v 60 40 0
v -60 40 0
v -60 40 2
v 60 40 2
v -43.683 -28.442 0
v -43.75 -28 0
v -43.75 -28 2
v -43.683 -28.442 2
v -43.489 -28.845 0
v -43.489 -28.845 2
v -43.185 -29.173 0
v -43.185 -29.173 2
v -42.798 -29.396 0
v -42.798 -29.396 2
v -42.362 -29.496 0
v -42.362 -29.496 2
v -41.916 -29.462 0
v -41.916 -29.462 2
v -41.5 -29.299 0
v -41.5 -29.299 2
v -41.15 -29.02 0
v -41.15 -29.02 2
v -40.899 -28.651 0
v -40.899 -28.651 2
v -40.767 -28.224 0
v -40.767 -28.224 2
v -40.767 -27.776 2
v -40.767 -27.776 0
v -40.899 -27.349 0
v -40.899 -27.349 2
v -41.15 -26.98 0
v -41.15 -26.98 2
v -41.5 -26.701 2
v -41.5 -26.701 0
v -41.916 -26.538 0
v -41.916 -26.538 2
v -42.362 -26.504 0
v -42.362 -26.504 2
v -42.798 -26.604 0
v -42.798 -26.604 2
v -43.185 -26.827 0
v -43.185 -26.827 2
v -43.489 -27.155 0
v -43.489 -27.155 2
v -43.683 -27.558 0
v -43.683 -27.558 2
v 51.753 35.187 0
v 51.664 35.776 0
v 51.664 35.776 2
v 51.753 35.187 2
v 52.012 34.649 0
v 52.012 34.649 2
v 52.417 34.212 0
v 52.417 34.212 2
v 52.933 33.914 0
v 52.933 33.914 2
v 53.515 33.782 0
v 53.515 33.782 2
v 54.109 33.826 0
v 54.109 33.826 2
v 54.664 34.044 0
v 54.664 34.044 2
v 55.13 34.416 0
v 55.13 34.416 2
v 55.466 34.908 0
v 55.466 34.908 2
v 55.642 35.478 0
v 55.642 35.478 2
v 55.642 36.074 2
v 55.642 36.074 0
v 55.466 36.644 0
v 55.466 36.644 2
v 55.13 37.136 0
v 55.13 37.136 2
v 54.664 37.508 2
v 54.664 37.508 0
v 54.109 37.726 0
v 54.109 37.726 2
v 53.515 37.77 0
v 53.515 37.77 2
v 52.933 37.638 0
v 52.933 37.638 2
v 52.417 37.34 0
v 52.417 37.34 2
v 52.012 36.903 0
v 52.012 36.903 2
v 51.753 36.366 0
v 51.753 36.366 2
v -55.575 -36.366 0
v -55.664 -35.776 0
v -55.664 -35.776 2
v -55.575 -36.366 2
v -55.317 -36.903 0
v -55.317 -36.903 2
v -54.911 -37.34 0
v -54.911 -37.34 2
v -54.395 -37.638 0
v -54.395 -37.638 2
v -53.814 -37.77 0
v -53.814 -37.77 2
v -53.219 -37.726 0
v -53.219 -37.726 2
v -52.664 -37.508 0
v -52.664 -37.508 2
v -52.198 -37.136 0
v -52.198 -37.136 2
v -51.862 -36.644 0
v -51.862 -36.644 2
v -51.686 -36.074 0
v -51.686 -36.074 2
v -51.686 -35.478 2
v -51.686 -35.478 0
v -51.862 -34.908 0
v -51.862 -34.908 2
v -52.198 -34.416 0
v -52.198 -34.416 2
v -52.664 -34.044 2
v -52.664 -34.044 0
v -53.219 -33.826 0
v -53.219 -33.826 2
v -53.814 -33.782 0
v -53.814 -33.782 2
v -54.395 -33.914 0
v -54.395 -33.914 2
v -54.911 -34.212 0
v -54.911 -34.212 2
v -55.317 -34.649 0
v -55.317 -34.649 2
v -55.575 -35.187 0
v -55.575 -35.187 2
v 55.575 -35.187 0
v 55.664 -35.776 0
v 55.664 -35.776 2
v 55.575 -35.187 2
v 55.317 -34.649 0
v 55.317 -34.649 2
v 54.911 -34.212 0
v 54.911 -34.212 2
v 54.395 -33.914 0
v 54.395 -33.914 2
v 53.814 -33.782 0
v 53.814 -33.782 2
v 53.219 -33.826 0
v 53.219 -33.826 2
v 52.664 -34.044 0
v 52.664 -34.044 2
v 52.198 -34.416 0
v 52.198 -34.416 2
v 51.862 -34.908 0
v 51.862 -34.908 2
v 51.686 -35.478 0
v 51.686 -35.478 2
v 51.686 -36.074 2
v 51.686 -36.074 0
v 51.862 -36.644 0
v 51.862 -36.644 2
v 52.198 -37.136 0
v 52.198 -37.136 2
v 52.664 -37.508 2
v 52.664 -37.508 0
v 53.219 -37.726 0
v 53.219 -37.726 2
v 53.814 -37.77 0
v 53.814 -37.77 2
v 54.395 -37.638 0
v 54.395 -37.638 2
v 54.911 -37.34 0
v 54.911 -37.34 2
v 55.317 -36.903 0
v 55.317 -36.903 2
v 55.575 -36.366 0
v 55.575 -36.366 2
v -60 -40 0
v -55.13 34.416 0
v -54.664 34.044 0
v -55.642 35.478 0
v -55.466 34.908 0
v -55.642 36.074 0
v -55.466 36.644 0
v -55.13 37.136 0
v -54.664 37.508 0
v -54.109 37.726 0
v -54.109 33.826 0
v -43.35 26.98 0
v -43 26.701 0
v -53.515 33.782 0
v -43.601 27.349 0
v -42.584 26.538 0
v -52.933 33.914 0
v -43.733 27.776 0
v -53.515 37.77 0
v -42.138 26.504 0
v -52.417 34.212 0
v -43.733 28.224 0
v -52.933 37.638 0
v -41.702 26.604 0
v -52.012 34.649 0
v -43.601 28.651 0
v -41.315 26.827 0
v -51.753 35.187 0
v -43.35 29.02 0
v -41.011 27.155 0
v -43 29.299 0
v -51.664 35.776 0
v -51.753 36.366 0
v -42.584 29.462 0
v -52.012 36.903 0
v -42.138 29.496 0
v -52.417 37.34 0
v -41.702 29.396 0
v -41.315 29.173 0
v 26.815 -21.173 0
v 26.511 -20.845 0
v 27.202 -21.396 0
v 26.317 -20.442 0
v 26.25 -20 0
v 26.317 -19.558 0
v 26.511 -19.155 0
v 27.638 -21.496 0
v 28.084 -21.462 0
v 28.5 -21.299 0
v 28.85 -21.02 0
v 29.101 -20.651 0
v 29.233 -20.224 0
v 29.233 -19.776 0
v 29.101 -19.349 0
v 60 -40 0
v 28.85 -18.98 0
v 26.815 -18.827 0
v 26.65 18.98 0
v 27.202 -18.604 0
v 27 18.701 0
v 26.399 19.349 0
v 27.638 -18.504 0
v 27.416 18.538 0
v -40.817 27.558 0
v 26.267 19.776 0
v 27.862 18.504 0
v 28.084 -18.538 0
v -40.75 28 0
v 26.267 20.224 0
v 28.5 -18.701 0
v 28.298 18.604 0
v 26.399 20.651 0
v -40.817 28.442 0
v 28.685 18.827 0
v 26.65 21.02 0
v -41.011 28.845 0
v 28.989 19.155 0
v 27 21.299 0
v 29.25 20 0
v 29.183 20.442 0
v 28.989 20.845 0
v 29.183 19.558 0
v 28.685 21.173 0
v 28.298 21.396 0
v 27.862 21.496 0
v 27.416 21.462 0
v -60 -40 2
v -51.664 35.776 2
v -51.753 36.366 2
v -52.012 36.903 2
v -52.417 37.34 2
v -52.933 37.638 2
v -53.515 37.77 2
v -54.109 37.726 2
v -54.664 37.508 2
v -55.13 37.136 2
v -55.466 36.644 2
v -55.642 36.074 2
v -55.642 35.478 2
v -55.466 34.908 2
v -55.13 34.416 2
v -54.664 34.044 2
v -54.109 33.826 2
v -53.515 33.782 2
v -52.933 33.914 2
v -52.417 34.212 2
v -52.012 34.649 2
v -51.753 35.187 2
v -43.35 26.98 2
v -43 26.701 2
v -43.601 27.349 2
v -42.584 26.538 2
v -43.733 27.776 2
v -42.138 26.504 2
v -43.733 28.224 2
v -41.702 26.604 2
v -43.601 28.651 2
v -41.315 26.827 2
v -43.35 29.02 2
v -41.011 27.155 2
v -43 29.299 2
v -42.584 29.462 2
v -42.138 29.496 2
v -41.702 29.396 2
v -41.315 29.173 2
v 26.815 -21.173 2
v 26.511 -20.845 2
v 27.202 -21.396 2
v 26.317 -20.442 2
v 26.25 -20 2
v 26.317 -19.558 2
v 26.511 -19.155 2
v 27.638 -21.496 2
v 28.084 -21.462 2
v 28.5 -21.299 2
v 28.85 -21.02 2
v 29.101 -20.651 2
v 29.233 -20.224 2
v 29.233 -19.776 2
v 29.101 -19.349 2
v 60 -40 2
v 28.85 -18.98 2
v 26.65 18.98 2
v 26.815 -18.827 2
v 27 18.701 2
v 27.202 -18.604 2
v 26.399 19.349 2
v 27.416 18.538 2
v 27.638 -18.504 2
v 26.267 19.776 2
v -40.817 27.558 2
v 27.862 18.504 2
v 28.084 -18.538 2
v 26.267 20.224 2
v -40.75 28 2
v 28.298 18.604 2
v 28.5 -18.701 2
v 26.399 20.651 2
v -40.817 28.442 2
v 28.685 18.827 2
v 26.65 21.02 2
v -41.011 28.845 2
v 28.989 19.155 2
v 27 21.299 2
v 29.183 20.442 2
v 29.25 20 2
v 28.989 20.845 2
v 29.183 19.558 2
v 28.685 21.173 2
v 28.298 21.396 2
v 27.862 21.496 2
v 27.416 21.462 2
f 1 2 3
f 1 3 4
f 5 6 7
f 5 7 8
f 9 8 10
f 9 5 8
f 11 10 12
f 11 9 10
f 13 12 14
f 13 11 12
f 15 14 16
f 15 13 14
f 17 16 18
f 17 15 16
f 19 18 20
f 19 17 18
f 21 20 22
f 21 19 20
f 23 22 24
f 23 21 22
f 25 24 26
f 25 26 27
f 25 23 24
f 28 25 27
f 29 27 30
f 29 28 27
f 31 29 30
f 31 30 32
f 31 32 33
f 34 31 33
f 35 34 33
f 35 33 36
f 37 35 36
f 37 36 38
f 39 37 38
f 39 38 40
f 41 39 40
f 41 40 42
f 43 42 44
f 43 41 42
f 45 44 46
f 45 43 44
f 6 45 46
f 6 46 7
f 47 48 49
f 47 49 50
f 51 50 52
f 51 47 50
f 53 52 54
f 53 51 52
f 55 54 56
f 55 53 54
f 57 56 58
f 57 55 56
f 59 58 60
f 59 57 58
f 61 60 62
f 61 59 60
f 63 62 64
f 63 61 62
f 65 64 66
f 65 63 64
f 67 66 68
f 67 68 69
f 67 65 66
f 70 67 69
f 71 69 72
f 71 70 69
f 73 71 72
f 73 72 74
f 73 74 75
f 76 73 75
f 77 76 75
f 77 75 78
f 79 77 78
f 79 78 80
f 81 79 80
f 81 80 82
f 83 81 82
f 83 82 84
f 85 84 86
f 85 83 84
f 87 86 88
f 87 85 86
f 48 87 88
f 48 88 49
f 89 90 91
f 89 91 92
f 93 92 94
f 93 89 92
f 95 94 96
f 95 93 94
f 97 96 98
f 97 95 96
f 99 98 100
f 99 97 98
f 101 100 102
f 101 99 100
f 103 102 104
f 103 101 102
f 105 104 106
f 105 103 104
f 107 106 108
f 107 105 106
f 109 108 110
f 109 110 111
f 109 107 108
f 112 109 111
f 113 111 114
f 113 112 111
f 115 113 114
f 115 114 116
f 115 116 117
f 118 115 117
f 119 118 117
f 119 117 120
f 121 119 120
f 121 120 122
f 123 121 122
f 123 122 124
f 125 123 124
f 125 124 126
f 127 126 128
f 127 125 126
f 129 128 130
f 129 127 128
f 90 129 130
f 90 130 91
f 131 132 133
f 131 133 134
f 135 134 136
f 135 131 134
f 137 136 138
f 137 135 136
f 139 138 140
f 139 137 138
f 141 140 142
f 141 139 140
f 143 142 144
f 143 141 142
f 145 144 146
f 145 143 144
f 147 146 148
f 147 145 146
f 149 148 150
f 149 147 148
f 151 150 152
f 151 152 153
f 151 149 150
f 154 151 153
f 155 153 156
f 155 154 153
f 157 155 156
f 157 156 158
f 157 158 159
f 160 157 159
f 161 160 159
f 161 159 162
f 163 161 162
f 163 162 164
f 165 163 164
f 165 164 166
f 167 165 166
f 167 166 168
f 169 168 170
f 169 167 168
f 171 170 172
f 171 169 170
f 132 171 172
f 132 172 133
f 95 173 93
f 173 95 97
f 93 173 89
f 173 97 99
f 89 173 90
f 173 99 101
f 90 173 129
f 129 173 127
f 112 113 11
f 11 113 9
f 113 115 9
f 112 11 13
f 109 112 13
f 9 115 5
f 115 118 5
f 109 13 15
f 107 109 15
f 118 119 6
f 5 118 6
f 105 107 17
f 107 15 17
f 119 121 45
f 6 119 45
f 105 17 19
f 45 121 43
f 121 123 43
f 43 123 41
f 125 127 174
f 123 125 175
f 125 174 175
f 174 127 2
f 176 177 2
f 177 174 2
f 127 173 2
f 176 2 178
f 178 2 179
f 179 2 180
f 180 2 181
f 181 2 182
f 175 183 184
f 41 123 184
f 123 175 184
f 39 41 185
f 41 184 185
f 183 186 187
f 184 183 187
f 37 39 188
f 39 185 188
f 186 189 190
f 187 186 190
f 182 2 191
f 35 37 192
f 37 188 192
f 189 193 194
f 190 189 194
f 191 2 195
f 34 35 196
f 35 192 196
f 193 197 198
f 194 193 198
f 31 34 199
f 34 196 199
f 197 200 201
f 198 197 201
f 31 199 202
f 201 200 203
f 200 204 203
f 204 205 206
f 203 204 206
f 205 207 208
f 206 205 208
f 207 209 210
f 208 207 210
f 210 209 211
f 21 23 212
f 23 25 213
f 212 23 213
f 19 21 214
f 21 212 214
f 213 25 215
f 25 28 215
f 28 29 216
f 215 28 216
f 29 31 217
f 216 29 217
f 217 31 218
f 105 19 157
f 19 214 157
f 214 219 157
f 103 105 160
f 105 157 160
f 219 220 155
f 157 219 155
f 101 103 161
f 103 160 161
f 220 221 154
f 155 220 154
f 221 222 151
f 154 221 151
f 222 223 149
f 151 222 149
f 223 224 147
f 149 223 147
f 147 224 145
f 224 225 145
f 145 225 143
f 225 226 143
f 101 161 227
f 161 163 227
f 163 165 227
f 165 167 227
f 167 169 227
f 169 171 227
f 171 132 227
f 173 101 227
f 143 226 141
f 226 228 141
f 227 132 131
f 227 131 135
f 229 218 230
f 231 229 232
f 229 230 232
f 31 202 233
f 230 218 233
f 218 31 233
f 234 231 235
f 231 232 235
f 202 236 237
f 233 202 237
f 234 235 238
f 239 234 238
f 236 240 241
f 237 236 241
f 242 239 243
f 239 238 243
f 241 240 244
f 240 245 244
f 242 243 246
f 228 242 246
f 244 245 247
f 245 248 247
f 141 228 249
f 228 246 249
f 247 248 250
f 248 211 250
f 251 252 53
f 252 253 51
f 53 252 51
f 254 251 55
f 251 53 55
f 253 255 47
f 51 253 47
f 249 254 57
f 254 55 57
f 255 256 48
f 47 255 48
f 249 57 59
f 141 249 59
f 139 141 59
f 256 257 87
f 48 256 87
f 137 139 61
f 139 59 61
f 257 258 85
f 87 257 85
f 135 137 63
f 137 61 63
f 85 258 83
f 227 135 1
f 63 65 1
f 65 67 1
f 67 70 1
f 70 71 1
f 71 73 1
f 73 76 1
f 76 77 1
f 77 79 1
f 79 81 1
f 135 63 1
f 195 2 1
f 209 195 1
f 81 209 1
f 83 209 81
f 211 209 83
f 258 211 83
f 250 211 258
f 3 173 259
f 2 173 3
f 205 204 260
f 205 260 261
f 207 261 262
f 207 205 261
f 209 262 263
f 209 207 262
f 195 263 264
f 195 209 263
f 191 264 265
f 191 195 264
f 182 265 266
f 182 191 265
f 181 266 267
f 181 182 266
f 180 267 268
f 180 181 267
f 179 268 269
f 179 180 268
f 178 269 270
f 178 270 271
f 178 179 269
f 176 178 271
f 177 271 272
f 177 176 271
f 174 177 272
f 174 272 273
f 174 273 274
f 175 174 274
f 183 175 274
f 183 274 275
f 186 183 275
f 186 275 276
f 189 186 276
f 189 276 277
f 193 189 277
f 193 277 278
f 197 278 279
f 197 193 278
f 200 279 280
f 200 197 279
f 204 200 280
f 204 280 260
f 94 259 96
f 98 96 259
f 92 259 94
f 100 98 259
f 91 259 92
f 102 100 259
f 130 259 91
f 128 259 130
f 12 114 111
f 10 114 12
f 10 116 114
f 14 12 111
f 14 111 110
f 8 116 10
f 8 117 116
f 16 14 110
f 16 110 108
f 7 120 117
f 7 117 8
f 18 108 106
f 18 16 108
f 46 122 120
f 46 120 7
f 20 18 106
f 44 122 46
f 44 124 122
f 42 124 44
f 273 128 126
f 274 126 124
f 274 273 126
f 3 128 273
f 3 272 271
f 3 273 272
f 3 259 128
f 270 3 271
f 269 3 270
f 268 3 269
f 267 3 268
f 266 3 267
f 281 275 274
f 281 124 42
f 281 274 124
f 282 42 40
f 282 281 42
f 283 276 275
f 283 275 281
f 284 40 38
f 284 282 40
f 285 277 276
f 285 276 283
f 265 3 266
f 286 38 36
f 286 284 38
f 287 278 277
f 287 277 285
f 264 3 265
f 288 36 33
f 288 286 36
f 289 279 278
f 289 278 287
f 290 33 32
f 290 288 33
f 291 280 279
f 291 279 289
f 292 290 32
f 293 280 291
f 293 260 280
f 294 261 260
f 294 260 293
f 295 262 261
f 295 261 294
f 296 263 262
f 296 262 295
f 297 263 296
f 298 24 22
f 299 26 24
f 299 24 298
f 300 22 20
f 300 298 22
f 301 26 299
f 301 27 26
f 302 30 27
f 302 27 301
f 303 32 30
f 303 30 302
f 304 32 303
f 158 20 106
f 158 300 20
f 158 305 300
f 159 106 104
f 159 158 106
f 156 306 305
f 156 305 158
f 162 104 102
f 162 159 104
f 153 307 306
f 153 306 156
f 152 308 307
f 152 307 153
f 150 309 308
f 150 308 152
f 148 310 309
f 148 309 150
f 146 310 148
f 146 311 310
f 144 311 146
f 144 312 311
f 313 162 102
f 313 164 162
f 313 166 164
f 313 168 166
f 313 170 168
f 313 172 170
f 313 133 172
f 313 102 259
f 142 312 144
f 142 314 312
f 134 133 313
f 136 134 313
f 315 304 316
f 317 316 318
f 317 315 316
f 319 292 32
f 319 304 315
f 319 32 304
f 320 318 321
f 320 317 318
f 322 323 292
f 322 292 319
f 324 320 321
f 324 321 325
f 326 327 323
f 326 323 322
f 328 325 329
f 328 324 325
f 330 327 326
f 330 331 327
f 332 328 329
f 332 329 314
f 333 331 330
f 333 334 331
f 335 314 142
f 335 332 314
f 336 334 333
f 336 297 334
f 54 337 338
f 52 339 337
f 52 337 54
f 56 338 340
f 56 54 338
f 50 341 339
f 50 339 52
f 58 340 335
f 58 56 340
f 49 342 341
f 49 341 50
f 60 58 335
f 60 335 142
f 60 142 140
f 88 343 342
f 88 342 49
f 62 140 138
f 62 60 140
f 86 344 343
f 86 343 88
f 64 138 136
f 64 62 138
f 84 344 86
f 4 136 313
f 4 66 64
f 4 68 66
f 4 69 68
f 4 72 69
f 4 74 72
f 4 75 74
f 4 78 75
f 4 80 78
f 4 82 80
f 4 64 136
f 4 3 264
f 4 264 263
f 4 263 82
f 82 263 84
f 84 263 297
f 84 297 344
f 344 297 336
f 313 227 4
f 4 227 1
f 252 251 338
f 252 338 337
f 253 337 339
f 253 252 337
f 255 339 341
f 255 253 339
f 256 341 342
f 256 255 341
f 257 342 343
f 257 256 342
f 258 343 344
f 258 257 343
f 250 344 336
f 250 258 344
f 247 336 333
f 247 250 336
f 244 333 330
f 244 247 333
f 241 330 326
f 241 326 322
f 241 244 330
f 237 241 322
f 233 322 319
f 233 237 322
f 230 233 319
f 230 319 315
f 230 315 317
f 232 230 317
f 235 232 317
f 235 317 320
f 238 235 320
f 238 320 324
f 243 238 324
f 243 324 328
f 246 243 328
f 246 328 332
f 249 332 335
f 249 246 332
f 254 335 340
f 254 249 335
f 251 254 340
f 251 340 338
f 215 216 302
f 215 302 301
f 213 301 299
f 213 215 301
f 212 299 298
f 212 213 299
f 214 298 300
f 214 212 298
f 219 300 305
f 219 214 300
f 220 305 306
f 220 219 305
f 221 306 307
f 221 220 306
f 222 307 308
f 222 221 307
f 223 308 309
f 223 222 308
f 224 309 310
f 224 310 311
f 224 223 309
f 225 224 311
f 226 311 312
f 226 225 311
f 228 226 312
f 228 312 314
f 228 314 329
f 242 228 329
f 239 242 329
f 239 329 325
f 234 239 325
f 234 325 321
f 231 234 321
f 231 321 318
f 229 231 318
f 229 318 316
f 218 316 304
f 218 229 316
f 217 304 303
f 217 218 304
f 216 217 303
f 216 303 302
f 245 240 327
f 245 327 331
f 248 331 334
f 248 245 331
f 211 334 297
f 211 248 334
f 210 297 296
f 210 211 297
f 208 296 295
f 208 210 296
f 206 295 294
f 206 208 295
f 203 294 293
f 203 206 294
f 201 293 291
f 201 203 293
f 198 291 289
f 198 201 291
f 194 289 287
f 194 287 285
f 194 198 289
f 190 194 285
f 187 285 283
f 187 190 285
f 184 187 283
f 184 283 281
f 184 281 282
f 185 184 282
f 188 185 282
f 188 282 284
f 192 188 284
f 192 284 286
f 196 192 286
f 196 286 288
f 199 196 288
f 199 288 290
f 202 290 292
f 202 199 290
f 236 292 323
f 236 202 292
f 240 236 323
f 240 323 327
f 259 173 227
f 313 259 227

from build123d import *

# Parameters (mm, degrees)
SKETCH1_W           = 120
SKETCH1_H           = 80
SKETCH1_R           = 1.5
SKETCH1_R_2         = 2
BOSS_EXTRUDE3_DEPTH = 2


with BuildPart() as part:
    # Sketch1 → Boss-Extrude3 (new body)
    with BuildSketch(Plane.XY):
        Rectangle(SKETCH1_W, SKETCH1_H)
        with Locations((-42.25, 28)):
            Circle(SKETCH1_R, mode=Mode.SUBTRACT)
        with Locations((27.75, 20)):
            Circle(SKETCH1_R, mode=Mode.SUBTRACT)
        with Locations(Location((27.75, -20, 0), (0, 0, 180))):
            Circle(SKETCH1_R, mode=Mode.SUBTRACT)
        with Locations(Location((-42.25, -28, 0), (0, 0, 180))):
            Circle(SKETCH1_R, mode=Mode.SUBTRACT)
        with Locations((-53.664076267, 35.776050844)):
            Circle(SKETCH1_R_2, mode=Mode.SUBTRACT)
        with Locations(Location((53.664076267, 35.776050844, 0), (0, 0, 180))):
            Circle(SKETCH1_R_2, mode=Mode.SUBTRACT)
        with Locations((53.664076267, -35.776050844)):
            Circle(SKETCH1_R_2, mode=Mode.SUBTRACT)
        with Locations(Location((-53.664076267, -35.776050844, 0), (0, 0, 180))):
            Circle(SKETCH1_R_2, mode=Mode.SUBTRACT)
    extrude(amount=BOSS_EXTRUDE3_DEPTH)


solid = part.part
